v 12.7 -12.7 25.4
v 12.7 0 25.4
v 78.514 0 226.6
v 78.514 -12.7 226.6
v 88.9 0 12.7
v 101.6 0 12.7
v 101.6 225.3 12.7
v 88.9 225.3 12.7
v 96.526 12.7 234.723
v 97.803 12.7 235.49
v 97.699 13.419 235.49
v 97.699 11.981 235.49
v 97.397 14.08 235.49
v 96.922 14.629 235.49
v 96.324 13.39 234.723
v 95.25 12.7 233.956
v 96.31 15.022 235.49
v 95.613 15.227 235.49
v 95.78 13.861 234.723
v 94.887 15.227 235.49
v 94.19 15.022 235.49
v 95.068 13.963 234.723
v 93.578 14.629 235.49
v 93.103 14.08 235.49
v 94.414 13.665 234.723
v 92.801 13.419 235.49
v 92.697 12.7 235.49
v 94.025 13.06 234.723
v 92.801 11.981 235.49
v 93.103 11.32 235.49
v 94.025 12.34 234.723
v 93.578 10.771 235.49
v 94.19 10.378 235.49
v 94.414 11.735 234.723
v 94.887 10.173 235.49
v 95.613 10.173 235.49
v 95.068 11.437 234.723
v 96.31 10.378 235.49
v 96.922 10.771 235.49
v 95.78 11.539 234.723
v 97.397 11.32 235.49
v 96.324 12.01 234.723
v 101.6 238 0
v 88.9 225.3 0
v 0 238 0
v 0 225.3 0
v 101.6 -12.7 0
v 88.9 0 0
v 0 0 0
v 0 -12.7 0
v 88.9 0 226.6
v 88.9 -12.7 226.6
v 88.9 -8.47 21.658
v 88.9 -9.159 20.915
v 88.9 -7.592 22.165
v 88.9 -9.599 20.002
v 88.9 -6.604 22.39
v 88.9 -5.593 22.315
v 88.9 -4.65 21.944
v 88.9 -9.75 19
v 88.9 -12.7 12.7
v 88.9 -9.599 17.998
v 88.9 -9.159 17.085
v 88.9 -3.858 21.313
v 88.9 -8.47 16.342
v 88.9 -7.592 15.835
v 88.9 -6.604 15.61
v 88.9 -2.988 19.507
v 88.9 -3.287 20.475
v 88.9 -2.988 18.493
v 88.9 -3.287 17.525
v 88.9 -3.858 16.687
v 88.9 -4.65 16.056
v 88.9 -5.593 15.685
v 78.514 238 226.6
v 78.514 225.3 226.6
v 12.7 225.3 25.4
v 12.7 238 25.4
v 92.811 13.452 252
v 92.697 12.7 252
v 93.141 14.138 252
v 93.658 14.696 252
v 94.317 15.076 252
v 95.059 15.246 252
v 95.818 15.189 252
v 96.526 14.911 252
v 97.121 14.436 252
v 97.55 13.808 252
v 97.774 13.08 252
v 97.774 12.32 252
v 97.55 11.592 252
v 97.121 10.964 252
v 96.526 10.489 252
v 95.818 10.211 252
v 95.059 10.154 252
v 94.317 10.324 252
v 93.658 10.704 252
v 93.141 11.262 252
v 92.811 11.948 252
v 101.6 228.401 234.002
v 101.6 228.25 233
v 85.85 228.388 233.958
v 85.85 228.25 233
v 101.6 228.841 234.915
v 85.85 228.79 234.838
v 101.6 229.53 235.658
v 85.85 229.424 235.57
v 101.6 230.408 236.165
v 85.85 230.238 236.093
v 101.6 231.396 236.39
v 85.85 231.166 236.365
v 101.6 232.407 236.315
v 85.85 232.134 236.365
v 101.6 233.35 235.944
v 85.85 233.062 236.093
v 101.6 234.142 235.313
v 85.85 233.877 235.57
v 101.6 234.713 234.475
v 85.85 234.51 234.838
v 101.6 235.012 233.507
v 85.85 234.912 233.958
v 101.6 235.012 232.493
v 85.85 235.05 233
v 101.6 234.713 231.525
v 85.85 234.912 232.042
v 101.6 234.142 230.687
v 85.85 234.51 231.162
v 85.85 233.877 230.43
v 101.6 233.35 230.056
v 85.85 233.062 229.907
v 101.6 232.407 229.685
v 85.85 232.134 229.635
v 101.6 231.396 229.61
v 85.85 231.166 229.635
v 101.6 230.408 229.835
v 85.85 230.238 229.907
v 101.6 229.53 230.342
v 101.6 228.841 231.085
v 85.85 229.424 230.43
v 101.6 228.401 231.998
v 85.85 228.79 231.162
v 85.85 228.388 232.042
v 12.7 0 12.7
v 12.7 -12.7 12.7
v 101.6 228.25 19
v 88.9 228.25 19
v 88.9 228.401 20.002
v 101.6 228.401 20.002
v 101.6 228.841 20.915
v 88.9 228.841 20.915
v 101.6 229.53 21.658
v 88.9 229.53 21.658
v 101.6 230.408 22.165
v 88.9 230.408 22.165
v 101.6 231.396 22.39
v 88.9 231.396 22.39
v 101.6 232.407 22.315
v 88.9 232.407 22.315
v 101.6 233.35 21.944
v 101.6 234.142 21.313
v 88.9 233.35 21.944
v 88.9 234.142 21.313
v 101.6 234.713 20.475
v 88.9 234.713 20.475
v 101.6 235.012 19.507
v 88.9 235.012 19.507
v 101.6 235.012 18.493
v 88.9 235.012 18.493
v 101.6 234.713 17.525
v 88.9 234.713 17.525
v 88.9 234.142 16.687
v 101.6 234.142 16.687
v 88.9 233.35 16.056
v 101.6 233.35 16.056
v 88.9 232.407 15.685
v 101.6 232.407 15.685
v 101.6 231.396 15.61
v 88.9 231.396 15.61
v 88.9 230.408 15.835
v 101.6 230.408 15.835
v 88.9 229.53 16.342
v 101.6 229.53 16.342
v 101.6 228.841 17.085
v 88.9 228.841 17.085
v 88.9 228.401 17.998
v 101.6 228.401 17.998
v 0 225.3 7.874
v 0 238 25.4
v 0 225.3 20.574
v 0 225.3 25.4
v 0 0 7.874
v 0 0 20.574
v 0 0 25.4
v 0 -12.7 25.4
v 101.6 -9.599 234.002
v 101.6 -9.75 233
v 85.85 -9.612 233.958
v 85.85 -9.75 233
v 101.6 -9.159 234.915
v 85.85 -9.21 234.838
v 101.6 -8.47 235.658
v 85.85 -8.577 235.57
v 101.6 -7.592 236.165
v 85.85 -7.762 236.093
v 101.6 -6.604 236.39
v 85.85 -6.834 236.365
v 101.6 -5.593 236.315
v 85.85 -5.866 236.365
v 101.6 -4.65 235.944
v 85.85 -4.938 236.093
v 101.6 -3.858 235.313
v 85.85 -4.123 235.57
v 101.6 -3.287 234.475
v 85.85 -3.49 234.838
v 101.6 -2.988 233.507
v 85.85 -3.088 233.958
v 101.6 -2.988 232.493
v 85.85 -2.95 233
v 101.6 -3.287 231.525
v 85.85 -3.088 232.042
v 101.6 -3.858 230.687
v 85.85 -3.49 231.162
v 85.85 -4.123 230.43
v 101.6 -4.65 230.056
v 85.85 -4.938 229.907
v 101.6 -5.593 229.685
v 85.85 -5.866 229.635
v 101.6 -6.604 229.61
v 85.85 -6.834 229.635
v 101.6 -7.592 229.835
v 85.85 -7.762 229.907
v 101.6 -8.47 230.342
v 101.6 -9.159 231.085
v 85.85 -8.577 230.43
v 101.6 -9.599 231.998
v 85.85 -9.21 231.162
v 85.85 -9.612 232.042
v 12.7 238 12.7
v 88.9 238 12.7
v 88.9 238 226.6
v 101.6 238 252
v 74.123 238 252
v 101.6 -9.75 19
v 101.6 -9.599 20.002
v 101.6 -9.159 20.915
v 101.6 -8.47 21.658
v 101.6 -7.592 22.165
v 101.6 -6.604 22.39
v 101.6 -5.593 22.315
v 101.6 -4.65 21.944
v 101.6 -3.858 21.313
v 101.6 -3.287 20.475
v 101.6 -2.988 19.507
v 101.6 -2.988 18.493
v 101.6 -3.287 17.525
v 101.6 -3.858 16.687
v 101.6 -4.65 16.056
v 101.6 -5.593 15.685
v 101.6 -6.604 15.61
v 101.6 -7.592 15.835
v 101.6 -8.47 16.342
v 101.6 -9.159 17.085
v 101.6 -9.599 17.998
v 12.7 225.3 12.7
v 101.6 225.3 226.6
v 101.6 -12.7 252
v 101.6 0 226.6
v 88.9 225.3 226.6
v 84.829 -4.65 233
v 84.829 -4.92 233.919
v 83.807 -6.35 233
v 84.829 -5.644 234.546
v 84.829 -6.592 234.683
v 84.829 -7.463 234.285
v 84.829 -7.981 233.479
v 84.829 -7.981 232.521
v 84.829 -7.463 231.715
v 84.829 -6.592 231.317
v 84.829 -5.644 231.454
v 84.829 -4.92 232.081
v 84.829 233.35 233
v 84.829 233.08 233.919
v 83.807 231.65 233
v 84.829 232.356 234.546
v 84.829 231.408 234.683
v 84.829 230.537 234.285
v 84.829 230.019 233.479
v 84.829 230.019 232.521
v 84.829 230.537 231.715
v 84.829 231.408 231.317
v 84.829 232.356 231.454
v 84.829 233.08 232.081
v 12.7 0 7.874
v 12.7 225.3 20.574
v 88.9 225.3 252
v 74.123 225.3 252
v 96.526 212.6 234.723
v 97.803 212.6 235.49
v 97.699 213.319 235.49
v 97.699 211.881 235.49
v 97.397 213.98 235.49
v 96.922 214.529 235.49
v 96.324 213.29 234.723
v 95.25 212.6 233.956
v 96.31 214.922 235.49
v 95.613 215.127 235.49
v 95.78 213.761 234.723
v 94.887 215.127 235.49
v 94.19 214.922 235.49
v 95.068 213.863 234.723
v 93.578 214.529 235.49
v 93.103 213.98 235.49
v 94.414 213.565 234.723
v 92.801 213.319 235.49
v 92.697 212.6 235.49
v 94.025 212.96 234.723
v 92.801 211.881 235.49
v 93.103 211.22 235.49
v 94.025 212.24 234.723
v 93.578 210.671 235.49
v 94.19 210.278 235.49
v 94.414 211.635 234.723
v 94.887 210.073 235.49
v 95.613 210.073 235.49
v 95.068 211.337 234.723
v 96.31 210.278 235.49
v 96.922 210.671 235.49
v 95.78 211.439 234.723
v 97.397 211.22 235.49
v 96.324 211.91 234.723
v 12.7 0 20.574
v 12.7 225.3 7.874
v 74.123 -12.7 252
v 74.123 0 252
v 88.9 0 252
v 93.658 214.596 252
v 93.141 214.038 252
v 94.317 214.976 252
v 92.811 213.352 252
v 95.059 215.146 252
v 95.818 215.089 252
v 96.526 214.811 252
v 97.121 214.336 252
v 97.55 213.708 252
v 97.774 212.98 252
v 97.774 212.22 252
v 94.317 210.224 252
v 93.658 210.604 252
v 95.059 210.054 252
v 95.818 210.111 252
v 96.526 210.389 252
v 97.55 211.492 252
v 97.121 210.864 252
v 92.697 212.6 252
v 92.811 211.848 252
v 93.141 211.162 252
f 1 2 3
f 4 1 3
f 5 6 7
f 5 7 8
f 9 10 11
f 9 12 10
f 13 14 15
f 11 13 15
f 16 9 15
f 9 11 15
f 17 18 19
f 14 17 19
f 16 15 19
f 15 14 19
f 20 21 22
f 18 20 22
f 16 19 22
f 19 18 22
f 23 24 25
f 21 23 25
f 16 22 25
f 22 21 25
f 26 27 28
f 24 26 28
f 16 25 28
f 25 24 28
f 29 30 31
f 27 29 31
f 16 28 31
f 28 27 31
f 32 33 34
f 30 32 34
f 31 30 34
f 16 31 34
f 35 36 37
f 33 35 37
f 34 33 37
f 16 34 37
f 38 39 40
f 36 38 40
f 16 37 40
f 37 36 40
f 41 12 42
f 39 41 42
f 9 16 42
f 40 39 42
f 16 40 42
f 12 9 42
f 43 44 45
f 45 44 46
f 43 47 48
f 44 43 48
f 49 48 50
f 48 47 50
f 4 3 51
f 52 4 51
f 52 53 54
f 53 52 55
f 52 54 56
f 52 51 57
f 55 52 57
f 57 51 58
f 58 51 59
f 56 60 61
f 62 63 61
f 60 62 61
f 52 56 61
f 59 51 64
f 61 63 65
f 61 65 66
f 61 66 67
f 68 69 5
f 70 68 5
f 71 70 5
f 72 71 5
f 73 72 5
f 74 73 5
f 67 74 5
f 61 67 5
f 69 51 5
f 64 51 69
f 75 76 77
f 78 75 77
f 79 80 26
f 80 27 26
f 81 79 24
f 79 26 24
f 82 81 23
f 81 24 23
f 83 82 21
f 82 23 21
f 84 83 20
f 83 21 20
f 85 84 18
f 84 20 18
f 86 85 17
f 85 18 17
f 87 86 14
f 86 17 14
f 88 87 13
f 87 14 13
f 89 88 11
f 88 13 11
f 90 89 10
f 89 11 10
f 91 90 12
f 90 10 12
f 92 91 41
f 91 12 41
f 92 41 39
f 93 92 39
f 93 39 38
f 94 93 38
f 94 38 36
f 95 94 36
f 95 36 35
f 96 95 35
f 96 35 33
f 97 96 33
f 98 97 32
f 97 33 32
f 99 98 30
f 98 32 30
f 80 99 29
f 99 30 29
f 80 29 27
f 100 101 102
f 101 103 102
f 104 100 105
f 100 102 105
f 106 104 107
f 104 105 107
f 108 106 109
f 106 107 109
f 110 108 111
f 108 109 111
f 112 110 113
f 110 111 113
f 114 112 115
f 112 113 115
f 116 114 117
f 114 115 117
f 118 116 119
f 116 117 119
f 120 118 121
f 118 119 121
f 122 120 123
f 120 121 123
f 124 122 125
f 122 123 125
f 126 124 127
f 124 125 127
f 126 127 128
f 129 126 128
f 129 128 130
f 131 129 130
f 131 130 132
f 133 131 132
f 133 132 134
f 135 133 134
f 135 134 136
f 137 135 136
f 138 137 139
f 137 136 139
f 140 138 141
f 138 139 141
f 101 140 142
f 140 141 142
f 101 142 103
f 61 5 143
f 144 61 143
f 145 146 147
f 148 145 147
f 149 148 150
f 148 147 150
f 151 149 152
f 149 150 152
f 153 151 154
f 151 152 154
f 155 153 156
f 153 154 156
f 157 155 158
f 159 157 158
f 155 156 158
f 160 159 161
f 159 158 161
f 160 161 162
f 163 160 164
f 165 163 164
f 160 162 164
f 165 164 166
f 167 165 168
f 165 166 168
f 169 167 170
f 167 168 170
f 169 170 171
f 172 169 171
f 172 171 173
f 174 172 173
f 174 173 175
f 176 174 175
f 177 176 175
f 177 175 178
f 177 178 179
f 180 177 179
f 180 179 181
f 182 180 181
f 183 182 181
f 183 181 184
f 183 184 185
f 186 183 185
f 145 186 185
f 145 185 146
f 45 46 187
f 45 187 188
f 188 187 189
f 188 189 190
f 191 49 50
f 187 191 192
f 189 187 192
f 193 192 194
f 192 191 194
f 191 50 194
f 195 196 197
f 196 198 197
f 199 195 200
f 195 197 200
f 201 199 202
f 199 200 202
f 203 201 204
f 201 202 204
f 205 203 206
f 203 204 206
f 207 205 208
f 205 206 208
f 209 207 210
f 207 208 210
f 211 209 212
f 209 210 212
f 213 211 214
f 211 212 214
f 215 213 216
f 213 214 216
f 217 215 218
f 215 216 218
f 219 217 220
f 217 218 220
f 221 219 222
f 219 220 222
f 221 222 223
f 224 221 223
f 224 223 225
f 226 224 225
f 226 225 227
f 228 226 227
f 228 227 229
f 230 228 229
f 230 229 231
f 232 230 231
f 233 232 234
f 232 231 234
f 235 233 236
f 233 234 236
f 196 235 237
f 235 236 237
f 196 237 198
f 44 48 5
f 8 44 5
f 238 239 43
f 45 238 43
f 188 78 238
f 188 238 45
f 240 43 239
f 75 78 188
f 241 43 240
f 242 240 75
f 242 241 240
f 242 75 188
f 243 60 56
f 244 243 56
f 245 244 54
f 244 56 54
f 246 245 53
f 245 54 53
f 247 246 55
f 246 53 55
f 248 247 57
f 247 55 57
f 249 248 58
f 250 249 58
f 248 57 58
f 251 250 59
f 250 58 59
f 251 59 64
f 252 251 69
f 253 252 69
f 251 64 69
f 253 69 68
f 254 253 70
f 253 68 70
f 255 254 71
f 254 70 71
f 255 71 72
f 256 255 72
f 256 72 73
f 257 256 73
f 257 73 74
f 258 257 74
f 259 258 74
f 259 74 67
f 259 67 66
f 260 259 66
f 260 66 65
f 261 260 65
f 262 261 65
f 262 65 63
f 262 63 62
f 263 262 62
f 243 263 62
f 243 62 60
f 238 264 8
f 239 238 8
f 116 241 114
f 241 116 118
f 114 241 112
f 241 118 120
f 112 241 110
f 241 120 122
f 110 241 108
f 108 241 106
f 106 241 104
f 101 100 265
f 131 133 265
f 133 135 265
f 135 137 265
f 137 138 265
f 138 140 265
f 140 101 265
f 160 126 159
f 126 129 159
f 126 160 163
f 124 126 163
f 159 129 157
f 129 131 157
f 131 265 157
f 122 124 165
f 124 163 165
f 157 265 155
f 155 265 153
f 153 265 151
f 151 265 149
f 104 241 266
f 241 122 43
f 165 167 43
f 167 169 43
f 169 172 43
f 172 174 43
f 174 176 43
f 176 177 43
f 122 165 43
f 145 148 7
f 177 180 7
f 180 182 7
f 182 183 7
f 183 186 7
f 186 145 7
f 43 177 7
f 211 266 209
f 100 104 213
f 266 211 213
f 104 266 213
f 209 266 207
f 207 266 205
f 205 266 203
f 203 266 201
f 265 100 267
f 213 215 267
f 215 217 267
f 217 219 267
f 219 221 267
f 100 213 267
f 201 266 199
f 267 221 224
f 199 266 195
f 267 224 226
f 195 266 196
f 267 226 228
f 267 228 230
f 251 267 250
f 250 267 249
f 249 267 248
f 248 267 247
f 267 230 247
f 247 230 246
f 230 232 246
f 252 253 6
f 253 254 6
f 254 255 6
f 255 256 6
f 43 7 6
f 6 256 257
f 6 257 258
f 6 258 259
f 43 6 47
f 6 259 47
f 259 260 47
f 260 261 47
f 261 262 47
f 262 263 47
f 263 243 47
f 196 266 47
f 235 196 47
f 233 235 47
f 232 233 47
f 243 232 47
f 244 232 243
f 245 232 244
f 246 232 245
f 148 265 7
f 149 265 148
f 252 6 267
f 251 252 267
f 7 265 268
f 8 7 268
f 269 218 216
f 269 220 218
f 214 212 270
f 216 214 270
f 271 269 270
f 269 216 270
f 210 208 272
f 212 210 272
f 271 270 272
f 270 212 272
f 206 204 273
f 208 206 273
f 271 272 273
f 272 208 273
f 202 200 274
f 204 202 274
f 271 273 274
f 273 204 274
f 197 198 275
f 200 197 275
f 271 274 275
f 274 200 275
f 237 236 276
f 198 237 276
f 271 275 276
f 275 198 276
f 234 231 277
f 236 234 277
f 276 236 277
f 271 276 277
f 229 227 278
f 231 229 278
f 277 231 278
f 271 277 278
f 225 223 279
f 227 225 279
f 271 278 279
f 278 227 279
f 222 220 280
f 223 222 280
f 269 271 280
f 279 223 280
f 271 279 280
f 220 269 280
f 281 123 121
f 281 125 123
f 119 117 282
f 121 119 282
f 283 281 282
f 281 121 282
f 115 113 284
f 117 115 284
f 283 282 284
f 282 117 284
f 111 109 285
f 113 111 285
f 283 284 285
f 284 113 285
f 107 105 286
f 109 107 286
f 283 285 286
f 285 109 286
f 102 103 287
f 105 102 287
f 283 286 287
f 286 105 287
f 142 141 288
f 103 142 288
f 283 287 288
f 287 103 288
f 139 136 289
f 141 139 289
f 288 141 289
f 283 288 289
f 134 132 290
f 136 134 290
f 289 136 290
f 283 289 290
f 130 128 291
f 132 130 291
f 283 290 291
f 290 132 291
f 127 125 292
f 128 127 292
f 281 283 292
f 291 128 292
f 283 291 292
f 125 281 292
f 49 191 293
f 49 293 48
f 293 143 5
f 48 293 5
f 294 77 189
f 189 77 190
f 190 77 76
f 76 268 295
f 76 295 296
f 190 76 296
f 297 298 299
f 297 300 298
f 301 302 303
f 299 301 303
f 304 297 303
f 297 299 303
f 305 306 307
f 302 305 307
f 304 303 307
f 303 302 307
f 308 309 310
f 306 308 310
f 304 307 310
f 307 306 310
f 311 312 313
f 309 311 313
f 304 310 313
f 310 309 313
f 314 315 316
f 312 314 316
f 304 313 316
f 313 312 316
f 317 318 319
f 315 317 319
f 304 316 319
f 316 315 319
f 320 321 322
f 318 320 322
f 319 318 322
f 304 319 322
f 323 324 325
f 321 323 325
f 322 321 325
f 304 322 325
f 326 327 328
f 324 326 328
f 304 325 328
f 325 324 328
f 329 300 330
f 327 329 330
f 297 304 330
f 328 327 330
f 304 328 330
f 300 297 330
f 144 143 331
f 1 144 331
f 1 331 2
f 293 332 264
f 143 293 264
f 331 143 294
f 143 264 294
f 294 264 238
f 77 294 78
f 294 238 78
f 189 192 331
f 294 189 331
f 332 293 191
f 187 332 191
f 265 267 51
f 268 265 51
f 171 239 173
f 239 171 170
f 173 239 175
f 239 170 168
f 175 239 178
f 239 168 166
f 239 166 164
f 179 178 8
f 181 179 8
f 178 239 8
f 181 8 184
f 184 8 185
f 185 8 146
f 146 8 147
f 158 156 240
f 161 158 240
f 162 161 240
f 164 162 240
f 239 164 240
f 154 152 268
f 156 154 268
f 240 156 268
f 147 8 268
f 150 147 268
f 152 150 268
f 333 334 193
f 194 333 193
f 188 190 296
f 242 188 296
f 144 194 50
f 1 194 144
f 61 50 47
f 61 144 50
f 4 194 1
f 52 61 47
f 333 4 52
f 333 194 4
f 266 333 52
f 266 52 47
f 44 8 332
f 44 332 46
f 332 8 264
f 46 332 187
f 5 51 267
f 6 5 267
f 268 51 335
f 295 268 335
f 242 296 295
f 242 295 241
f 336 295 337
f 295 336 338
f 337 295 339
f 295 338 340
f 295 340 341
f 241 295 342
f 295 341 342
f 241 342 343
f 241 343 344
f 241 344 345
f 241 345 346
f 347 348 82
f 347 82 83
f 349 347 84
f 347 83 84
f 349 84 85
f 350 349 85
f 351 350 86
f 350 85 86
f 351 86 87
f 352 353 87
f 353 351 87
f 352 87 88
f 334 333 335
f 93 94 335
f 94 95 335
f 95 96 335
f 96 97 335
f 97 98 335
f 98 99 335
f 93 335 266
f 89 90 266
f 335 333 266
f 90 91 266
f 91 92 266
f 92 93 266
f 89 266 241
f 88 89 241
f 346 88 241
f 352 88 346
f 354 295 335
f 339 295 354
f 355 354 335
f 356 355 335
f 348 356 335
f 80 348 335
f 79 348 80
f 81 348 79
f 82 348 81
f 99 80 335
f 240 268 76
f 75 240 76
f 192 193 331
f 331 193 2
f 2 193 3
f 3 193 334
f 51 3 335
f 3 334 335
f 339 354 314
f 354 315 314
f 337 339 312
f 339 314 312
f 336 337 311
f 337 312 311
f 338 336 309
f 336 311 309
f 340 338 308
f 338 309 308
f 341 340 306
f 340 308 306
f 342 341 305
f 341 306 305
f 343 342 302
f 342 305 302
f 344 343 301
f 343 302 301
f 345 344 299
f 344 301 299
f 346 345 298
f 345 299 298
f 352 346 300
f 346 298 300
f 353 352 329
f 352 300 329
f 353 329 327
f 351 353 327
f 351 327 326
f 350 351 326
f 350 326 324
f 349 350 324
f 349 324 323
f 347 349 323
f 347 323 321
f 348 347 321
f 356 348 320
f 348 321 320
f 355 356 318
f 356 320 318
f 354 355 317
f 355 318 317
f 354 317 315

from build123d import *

# Parameters (mm, degrees)
F1_DEPTH = 12.7
F2_W     = 12.7
F2_H     = 12.7
F3_DEPTH = 225.300032
F4_W     = 12.7
F4_H     = 25.4
F5_DEPTH = 12.7
F7_D     = 6.8
F7_DEPTH = 15.75
F7_TIP   = 2.0429261047
F9_D     = 5.1054
F9_DEPTH = 16.51
F9_TIP   = 1.5338169022


# Not quite as in the source:
# - a feature names something its author has since deleted; it is built from what else it names


with BuildPart() as f1:
    # F0 (on Front) → F1 (new body)
    with BuildSketch(Plane.XZ):
        Polygon((0, 25.4), (0, 0), (101.6, 0), (101.6, 226.6), (101.6, 239.3), (101.6, 252), (74.1228589826, 252), align=None)
        Polygon((78.5142949131, 226.6), (88.9, 226.6), (88.9, 12.7), (12.7, 12.7), (12.7, 25.4), align=None, mode=Mode.SUBTRACT)
    extrude(amount=F1_DEPTH)

    # F2 (on face) → F3 (join)
    with BuildSketch(Plane(origin=(0, 0, 0), x_dir=(-1, 0, 0), z_dir=(0, 1, 0))):
        with Locations((-95.25, 6.35)):
            Rectangle(F2_W, F2_H)
        Polygon((-101.6, 252), (-101.6, 226.6), (-88.9, 226.6), (-88.9, 229.1588783264), (-88.9, 252), align=None)
        Polygon((-12.7, 20.574), (-12.7, 12.7), (-12.7, 7.874), (0, 7.874), (0, 20.574), align=None)
    extrude(amount=F3_DEPTH)

    # F4 (on face) → F5 (join)
    with BuildSketch(Plane(origin=(0, 225.300032, 0), x_dir=(-1, 0, 0), z_dir=(0, 1, 0))):
        Polygon((0, 0), (0, 25.4), (-74.1228589826, 252), (-88.9, 252), (-88.9, 226.6), (-101.6, 226.6), (-101.6, 0), align=None)
        Polygon((-88.9, 25.4), (-88.9, 226.6), (-78.5142949131, 226.6), (-12.7, 25.4), (-12.7, 12.7), (-88.9, 12.7), align=None, mode=Mode.SUBTRACT)
        with Locations((-95.25, 239.3)):
            Rectangle(F4_W, F4_H)
    extrude(amount=F5_DEPTH)

    # F7
    with Locations(Plane.YZ.offset(101.6)):
        with Locations((-6.35, 19), (-6.35, 233), (231.650032, 233), (231.650032, 19)):
            Hole(F7_D / 2, depth=F7_DEPTH)
            with Locations((0, 0, -(F7_DEPTH + F7_TIP / 2))):  # 118° drill point
                Cone(0, F7_D / 2, F7_TIP, mode=Mode.SUBTRACT)

    # F9
    with Locations(Plane.XY.offset(252)):
        with Locations((95.25, 212.600032), (95.25, 12.7)):
            Hole(F9_D / 2, depth=F9_DEPTH)
            with Locations((0, 0, -(F9_DEPTH + F9_TIP / 2))):  # 118° drill point
                Cone(0, F9_D / 2, F9_TIP, mode=Mode.SUBTRACT)


solid = f1.part
